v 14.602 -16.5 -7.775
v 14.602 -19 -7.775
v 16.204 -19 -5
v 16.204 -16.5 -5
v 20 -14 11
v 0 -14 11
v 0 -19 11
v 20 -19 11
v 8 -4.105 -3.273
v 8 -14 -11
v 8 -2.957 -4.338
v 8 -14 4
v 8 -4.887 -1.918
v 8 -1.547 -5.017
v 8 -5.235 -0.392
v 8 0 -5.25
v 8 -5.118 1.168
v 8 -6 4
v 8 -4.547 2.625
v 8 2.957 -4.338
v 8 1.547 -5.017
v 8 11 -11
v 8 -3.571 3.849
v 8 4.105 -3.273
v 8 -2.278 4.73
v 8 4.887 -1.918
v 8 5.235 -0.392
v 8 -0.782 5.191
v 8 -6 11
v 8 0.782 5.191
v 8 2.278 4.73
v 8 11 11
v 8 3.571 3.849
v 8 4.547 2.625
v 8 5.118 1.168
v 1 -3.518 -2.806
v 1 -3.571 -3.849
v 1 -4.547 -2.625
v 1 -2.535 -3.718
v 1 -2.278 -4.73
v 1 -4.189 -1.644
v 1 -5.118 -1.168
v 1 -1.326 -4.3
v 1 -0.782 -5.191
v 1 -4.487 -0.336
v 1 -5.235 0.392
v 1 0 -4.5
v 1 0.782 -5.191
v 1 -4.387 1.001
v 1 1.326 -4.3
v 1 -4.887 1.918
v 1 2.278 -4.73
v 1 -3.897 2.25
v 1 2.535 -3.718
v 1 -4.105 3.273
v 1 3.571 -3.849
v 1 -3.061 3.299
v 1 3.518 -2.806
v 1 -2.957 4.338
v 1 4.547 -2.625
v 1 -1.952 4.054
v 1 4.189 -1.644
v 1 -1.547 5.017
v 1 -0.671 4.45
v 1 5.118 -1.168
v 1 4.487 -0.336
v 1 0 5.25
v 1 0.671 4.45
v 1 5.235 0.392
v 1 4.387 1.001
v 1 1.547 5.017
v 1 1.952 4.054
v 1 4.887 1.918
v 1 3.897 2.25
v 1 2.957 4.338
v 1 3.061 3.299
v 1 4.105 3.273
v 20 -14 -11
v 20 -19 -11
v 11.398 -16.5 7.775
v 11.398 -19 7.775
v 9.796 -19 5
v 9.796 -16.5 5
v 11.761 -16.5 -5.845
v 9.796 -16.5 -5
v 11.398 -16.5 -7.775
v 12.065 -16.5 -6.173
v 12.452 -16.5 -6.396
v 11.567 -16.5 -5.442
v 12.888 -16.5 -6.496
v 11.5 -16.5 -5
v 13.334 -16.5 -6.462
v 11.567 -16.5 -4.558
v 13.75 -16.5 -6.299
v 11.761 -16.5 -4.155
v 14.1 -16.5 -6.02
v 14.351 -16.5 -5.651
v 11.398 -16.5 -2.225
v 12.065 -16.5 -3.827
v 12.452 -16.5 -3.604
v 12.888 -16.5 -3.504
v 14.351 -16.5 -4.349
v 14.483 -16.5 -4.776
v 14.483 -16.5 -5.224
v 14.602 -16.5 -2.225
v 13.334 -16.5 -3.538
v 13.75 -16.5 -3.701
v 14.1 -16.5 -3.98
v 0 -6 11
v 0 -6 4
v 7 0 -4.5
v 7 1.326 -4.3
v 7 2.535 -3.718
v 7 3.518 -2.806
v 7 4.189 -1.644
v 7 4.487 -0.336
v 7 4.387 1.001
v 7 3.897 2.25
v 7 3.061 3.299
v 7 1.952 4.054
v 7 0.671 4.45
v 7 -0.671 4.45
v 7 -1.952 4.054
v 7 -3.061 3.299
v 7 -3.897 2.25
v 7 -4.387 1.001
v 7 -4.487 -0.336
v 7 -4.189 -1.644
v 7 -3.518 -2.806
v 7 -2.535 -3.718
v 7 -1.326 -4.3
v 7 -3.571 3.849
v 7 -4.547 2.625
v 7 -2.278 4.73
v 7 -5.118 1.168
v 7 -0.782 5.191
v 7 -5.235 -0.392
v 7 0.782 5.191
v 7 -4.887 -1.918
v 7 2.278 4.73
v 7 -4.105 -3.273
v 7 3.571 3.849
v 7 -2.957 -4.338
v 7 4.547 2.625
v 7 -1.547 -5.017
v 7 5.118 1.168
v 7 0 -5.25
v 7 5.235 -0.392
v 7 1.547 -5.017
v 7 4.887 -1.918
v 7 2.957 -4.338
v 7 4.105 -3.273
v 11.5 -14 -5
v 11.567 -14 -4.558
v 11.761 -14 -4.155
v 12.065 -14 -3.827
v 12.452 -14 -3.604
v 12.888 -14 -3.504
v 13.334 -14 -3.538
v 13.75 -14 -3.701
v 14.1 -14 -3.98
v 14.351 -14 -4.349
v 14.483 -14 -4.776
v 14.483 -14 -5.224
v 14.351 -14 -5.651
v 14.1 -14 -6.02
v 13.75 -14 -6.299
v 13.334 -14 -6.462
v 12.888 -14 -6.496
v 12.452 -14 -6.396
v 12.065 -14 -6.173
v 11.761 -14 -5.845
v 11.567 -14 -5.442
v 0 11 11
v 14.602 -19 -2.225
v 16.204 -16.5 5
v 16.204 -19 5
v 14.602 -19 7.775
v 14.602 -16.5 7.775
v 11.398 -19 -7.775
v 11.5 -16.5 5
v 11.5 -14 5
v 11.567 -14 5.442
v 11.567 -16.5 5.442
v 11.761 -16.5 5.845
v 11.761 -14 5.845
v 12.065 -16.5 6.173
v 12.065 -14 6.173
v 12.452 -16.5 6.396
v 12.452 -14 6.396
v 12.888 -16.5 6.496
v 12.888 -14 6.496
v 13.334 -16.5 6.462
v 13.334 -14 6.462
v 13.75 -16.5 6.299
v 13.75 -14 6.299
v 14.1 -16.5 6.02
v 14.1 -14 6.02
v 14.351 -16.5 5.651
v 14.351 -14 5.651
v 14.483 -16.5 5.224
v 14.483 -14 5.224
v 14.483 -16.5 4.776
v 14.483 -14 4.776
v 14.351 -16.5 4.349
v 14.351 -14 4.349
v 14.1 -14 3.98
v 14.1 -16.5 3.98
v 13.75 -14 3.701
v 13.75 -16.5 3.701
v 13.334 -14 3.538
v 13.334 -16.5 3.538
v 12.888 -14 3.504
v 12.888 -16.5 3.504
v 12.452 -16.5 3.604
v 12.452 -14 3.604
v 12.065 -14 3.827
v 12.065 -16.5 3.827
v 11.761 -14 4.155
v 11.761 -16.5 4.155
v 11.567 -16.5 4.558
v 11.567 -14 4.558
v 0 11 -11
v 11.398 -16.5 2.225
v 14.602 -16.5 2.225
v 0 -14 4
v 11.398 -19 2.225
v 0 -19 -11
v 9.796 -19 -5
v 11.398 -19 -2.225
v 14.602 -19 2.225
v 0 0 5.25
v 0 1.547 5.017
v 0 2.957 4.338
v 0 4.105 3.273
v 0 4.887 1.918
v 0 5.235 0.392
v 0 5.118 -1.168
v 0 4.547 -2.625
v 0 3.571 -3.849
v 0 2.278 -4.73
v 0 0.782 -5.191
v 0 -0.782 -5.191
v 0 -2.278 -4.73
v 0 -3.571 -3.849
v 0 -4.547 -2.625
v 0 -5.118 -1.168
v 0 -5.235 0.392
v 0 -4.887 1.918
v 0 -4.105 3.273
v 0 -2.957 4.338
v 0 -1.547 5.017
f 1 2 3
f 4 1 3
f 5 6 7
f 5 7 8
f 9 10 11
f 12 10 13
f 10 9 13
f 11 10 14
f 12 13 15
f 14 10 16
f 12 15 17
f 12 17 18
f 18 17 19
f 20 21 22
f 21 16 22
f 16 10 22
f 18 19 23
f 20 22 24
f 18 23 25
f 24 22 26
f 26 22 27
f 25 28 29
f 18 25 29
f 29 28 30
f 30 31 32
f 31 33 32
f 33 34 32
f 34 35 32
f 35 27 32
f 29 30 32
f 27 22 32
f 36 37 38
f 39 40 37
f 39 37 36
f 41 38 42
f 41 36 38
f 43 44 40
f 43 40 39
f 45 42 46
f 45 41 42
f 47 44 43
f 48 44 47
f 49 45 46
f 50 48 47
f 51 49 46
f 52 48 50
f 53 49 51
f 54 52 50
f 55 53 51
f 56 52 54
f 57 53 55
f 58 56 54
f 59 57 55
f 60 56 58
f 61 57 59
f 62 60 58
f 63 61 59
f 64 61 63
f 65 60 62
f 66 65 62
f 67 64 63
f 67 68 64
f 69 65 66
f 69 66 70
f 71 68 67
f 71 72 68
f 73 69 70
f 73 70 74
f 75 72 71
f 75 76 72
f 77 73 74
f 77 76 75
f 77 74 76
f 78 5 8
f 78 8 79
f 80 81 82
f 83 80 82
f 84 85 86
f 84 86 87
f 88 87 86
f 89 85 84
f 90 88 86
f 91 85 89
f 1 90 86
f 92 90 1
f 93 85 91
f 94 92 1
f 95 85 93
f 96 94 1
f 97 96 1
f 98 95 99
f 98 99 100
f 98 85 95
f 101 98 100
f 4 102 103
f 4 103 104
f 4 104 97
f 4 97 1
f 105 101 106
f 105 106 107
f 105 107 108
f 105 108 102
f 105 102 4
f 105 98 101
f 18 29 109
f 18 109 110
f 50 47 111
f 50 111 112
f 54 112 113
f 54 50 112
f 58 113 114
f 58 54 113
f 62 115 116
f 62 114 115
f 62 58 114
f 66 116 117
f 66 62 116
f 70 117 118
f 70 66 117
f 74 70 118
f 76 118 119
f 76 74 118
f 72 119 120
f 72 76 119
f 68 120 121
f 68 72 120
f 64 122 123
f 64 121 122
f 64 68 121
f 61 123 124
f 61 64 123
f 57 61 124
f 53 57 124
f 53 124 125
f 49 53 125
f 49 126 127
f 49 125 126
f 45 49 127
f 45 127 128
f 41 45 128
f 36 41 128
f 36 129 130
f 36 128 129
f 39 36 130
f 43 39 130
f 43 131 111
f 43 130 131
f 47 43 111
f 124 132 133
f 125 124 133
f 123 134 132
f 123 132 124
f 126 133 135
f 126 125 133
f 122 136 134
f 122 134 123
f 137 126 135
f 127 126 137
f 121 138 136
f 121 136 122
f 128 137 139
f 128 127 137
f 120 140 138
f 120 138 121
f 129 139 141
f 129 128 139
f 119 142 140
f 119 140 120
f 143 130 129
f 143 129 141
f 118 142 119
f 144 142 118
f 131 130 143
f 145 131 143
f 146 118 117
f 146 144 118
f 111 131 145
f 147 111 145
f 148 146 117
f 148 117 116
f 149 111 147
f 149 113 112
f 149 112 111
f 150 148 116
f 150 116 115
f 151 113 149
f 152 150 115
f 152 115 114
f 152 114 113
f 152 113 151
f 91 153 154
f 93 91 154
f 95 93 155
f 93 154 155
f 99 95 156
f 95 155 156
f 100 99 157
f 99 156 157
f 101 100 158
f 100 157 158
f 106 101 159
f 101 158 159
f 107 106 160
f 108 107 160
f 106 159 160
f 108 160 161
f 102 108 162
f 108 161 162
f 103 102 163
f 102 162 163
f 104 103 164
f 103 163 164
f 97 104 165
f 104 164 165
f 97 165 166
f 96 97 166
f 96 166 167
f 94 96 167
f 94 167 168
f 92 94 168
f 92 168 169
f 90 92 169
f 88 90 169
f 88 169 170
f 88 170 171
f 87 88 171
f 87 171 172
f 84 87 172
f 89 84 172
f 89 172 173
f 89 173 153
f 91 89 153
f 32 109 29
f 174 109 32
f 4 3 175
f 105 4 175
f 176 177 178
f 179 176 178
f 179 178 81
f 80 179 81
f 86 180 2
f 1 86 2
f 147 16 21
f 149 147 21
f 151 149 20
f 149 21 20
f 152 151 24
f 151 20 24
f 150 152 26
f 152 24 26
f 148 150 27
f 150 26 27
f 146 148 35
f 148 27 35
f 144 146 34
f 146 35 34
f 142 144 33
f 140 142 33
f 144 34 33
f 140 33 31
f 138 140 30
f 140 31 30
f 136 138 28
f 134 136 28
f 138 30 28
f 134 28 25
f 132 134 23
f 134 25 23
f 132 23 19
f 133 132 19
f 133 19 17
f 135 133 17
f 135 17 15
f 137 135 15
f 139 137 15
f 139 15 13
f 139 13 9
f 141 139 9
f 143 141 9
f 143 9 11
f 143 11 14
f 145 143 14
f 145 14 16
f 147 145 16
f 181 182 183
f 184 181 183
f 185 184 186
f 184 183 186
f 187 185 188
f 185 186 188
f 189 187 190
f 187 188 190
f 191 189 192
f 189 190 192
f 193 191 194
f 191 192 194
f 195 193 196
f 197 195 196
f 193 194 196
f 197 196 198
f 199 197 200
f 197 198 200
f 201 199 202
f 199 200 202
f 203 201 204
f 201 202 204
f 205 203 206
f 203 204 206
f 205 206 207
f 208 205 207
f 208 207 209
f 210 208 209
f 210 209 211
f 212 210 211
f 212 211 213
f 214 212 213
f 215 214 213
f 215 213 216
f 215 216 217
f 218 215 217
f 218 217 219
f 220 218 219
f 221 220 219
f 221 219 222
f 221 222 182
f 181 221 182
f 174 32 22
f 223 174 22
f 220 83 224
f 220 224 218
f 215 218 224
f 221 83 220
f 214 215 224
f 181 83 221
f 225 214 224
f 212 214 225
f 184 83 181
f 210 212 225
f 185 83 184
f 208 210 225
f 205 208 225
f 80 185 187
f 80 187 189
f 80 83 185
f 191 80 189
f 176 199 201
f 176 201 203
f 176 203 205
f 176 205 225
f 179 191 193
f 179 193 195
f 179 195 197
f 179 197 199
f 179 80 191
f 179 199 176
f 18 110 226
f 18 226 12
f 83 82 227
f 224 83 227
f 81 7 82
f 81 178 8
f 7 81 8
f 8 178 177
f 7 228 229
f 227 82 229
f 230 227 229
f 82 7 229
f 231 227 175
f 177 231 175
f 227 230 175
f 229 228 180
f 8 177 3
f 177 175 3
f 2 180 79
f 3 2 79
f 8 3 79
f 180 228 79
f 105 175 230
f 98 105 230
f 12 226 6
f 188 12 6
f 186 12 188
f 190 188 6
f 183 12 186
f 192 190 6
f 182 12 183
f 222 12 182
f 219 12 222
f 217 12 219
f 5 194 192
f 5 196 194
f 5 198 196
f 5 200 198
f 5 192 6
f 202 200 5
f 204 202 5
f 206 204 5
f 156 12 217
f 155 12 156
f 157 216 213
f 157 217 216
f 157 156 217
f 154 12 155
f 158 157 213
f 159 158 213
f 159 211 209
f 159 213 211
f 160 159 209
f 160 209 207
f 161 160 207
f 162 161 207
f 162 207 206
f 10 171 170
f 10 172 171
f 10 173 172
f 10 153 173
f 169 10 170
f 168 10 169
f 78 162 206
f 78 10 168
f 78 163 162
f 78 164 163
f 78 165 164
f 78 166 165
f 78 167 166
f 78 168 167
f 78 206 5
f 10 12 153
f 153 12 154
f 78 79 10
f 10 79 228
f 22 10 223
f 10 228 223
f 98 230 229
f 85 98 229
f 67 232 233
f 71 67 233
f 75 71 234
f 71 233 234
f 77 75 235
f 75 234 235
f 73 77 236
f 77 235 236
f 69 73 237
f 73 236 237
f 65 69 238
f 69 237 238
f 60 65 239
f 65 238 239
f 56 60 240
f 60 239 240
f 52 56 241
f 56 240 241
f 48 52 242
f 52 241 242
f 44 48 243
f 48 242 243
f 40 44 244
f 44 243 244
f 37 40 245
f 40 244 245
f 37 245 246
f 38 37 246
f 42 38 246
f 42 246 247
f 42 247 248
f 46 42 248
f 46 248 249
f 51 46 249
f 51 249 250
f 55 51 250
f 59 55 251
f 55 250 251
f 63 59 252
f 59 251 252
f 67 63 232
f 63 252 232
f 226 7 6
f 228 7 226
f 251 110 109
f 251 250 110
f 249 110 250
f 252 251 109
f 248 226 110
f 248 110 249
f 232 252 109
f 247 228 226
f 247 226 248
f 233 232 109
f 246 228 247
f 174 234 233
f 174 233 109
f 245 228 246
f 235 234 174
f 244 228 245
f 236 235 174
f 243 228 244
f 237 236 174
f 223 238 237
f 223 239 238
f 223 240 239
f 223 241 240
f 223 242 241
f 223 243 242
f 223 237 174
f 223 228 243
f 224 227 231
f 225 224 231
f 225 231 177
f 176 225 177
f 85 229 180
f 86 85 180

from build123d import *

# Parameters (mm, degrees)
SKETCH_1_W               = 40
SKETCH_1_H               = 23
SKETCH_1_R               = 4.5
EXTRUDE_1_DEPTH          = 8
SKETCH_2_R               = 5.25
CUT_EXTRUDE_1_DEPTH      = 1
CUT_EXTRUDE_2_DEPTH      = 9
SKETCH_5_R               = 5.25
CUT_EXTRUDE_3_DEPTH      = 1
SKETCH_6_W               = 22
SKETCH_6_H               = 5
EXTRUDE_3_DEPTH          = 6
SKETCH_7_W               = 11
SKETCH_7_H               = 4
EXTRUDE_4_DEPTH          = 4
EXTRUDE_6_DEPTH          = 3
SKETCH_12_W              = 8
SKETCH_12_H              = 15
EXTRUDE_7_DEPTH          = 13
SKETCH_13_W              = 22
SKETCH_13_H              = 5
EXTRUDE_8_DEPTH          = 10
SKETCH_14_W              = 6
SKETCH_14_H              = 22
CUT_EXTRUDE_9_DEPTH      = 13
CUT_EXTRUDE_9_DEPTH_BACK = 10
SKETCH_15_R              = 1.5
CUT_EXTRUDE_10_DEPTH     = 6
CUT_EXTRUDE_11_DEPTH     = 2.5
SKETCH_17_W              = 22
SKETCH_17_H              = 5
EXTRUDE_9_DEPTH          = 2
SKETCH_18_W              = 8
SKETCH_18_H              = 5
EXTRUDE_10_DEPTH         = 7


with BuildPart() as part:
    # 草图1 → 凸台-拉伸1 (new body)
    with BuildSketch(Plane(origin=(0, 0, 0), x_dir=(0, 0, -1), z_dir=(1, 0, 0))):
        with Locations((9, 5.5)):
            Rectangle(SKETCH_1_W, SKETCH_1_H)
        Circle(SKETCH_1_R, mode=Mode.SUBTRACT)
        with Locations((18, 6)):
            Circle(SKETCH_1_R, mode=Mode.SUBTRACT)
    extrude(amount=EXTRUDE_1_DEPTH)

    # 草图2 → 切除-拉伸1 (cut)
    with BuildSketch(Plane.ZY):
        with Locations((-18, 6)):
            Circle(SKETCH_2_R)
        Circle(SKETCH_2_R)
    extrude(amount=-CUT_EXTRUDE_1_DEPTH, mode=Mode.SUBTRACT)

    # 草图3 → 切除-拉伸2 (cut, through all)
    with BuildSketch(Plane(origin=(8, 0, 0), x_dir=(0, 0, -1), z_dir=(1, 0, 0))):
        Polygon((29, 17), (11, 17), (-11, 17), (-11, 11), (11, 11), (11, -6), (29, -6), align=None)
    extrude(amount=-CUT_EXTRUDE_2_DEPTH, mode=Mode.SUBTRACT)

    # 草图5 → 切除-拉伸3 (cut)
    with BuildSketch(Plane(origin=(8, 0, 0), x_dir=(0, 0, -1), z_dir=(1, 0, 0))):
        Circle(SKETCH_5_R)
    extrude(amount=-CUT_EXTRUDE_3_DEPTH, mode=Mode.SUBTRACT)

    # 草图6 → 凸台-拉伸3 (add)
    with BuildSketch(Plane(origin=(8, 0, 0), x_dir=(0, 0, -1), z_dir=(1, 0, 0))):
        with Locations((0, -3.5)):
            Rectangle(SKETCH_6_W, SKETCH_6_H)
    extrude(amount=EXTRUDE_3_DEPTH)

    # 草图7 → 凸台-拉伸4 (add)
    with BuildSketch(Plane.XZ.offset(6)):
        with Locations((8.5, -9)):
            Rectangle(SKETCH_7_W, SKETCH_7_H)
    extrude(amount=EXTRUDE_4_DEPTH)

    # 草图11 → 凸台-拉伸6 (add)
    with BuildSketch(Plane(origin=(0, 0, -11), x_dir=(-1, 0, 0), z_dir=(0, 0, -1))):
        Polygon((-8, -1), (-8, 11), (-14, -1), align=None)
    extrude(amount=-EXTRUDE_6_DEPTH)

    # 草图12 → 凸台-拉伸7 (add)
    with BuildSketch(Plane.XZ.offset(6)):
        with Locations((4, -3.5)):
            Rectangle(SKETCH_12_W, SKETCH_12_H)
    extrude(amount=EXTRUDE_7_DEPTH)

    # 草图13 → 凸台-拉伸8 (add)
    with BuildSketch(Plane(origin=(8, 0, 0), x_dir=(0, 0, -1), z_dir=(1, 0, 0))):
        with Locations((0, -16.5)):
            Rectangle(SKETCH_13_W, SKETCH_13_H)
    extrude(amount=EXTRUDE_8_DEPTH)

    # 草图14 → 切除-拉伸9 (cut, two sides)
    with BuildSketch(Plane(origin=(0, -1, 0), x_dir=(1, 0, 0), z_dir=(0, 1, 0))) as cut_extrude_9_sk:
        with Locations((11, 0)):
            Rectangle(SKETCH_14_W, SKETCH_14_H)
    extrude(amount=CUT_EXTRUDE_9_DEPTH, mode=Mode.SUBTRACT)
    extrude(cut_extrude_9_sk.sketch, amount=-CUT_EXTRUDE_9_DEPTH_BACK, mode=Mode.SUBTRACT)

    # 草图15 → 切除-拉伸10 (cut, through all)
    with BuildSketch(Plane(origin=(0, -14, 0), x_dir=(-1, 0, 0), z_dir=(0, 1, 0))):
        with Locations((-13, -5)):
            Circle(SKETCH_15_R)
        with Locations((-13, 5)):
            Circle(SKETCH_15_R)
    extrude(amount=-CUT_EXTRUDE_10_DEPTH, mode=Mode.SUBTRACT)

    # 草图16 → 切除-拉伸11 (cut)
    with BuildSketch(Plane.XZ.offset(19)):
        Polygon((16.204293994, 5), (14.602146997, 7.775), (11.397853003, 7.775), (9.795706006, 5), (11.397853003, 2.225), (14.602146997, 2.225), align=None)
        Polygon((16.204293994, -5), (14.602146997, -2.225), (11.397853003, -2.225), (9.795706006, -5), (11.397853003, -7.775), (14.602146997, -7.775), align=None)
    extrude(amount=-CUT_EXTRUDE_11_DEPTH, mode=Mode.SUBTRACT)

    # 草图17 → 凸台-拉伸9 (add)
    with BuildSketch(Plane(origin=(18, 0, 0), x_dir=(0, 0, -1), z_dir=(1, 0, 0))):
        with Locations((0, -16.5)):
            Rectangle(SKETCH_17_W, SKETCH_17_H)
    extrude(amount=EXTRUDE_9_DEPTH)

    # 草图18 → 凸台-拉伸10 (add, through all)
    with BuildSketch(Plane.XY.offset(4)):
        with Locations((4, -16.5)):
            Rectangle(SKETCH_18_W, SKETCH_18_H)
    extrude(amount=EXTRUDE_10_DEPTH)


solid = part.part
